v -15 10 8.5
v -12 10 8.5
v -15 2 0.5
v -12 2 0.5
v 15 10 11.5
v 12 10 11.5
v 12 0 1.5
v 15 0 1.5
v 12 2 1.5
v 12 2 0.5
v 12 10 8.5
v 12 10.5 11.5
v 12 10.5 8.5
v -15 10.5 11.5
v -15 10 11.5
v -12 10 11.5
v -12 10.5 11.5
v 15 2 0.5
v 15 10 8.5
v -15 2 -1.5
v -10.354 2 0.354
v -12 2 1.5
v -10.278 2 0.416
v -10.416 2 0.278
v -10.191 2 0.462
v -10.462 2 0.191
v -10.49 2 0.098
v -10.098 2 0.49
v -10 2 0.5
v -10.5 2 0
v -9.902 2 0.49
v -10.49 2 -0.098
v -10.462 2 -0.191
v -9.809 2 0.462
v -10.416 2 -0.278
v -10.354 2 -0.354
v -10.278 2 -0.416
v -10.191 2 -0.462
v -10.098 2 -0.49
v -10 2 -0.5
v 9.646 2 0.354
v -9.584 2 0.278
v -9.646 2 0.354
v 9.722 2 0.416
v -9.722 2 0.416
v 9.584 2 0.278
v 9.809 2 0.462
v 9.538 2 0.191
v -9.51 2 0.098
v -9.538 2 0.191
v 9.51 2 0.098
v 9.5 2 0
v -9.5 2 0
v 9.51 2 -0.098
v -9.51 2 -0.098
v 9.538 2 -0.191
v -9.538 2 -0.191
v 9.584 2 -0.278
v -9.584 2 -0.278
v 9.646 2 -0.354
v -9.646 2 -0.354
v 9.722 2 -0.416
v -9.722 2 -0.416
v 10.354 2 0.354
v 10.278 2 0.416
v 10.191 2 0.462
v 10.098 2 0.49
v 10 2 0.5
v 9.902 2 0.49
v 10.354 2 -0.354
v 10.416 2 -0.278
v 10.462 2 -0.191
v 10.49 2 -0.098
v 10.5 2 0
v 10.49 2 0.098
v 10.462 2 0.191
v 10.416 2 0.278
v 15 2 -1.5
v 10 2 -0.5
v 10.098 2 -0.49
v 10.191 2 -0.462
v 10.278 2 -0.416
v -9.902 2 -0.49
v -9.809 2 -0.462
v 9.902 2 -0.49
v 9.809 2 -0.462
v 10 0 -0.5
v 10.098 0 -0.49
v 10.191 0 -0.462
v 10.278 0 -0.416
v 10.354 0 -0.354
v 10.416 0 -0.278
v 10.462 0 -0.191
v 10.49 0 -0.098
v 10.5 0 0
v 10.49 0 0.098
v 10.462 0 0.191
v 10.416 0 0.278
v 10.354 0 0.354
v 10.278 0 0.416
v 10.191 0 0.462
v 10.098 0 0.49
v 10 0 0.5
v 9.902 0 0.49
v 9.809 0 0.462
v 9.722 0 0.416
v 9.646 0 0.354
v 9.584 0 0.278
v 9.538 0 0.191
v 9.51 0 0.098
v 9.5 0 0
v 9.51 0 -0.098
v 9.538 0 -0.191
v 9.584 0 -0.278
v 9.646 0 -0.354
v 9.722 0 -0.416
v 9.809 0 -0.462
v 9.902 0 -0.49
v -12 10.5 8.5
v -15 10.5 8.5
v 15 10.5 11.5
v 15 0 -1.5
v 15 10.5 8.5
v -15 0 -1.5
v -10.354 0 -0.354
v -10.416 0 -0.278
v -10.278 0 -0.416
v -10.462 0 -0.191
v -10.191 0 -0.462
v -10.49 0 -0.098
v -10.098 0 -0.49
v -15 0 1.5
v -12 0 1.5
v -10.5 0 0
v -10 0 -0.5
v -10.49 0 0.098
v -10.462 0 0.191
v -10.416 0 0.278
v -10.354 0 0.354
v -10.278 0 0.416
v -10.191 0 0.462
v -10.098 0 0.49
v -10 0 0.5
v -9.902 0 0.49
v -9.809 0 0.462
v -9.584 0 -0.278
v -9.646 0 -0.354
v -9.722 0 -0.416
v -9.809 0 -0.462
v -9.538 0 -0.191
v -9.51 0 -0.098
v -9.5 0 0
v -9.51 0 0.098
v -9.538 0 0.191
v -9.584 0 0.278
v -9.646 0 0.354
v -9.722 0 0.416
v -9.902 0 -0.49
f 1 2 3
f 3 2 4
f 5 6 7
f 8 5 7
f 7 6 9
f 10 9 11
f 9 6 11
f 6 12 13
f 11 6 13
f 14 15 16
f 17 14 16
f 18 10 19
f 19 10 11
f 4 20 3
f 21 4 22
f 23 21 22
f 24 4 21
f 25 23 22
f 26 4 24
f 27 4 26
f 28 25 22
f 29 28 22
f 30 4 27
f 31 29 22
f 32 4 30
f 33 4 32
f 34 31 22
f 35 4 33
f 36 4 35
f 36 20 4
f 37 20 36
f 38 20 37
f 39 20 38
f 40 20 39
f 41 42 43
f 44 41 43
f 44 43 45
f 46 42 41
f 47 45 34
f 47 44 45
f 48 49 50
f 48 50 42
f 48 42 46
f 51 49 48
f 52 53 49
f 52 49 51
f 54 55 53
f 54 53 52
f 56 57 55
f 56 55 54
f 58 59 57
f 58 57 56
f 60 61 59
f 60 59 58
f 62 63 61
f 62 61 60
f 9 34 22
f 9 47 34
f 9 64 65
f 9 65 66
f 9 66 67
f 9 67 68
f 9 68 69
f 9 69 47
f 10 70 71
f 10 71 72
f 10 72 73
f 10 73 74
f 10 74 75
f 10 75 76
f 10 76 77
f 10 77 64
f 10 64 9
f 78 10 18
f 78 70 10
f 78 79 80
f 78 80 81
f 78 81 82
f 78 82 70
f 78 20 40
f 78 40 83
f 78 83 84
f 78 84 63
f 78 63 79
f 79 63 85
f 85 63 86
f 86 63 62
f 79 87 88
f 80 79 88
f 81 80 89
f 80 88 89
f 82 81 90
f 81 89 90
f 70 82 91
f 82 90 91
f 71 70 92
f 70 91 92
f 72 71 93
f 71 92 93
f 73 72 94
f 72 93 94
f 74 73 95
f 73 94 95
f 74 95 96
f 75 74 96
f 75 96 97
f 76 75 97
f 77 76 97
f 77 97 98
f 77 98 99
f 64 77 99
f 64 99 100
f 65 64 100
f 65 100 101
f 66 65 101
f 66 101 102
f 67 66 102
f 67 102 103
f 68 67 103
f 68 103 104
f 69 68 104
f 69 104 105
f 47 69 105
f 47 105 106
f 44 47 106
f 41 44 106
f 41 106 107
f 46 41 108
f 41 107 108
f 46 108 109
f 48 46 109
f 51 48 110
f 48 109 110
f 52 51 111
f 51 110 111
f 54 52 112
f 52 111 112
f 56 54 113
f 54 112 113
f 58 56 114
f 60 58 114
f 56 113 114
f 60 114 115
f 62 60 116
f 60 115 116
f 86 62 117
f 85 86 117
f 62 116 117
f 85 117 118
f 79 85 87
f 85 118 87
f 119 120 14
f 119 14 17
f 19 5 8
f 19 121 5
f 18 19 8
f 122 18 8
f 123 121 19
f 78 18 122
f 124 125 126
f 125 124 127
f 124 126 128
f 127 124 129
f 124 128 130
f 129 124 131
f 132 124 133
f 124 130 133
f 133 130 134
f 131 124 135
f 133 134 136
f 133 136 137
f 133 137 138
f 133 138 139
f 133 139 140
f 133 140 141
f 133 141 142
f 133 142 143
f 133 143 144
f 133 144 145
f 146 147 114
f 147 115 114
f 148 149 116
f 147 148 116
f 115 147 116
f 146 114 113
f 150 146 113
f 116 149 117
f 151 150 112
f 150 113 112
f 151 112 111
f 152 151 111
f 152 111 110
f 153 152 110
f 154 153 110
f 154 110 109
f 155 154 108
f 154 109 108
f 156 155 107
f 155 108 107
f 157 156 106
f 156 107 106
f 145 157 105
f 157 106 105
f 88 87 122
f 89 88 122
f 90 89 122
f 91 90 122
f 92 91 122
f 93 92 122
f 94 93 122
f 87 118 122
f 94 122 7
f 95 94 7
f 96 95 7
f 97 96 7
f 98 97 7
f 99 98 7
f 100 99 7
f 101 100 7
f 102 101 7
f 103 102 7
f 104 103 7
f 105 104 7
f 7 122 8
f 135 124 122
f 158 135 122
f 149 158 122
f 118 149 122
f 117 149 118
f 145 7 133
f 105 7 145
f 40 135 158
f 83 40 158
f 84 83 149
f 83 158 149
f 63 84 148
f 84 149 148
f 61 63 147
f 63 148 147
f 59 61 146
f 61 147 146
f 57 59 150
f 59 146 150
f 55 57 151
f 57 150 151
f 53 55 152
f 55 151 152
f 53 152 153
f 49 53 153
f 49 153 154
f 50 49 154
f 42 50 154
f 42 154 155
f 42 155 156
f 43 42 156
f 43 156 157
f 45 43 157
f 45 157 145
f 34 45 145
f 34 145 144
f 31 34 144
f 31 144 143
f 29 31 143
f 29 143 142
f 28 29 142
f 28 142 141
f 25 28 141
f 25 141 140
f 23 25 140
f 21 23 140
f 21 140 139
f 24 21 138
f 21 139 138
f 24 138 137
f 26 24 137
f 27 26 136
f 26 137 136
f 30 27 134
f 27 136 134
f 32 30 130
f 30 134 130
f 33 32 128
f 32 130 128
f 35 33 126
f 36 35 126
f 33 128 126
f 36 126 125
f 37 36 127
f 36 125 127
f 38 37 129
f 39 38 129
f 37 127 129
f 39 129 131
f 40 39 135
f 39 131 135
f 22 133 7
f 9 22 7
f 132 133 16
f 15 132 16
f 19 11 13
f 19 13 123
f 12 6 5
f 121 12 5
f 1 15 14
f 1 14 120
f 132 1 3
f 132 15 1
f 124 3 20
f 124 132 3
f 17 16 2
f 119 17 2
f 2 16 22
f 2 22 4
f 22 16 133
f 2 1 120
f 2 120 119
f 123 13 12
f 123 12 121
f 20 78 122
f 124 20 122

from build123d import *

# Parameters (mm, degrees)
SKETCH1_W           = 24
SKETCH1_H           = 3
BOSS_EXTRUDE1_DEPTH = 2
BOSS_EXTRUDE2_DEPTH = 3
BOSS_EXTRUDE3_DEPTH = 3
CUT_EXTRUDE1_REACH  = 23.383
SKETCH6_R           = 0.5
SKETCH9_W           = 3
SKETCH9_H           = 3
BOSS_EXTRUDE4_DEPTH = 0.5


with BuildPart() as part:
    # Sketch1 → Boss-Extrude1 (new body)
    with BuildSketch(Plane(origin=(0, 0, 0), x_dir=(1, 0, 0), z_dir=(0, 1, 0))):
        Rectangle(SKETCH1_W, SKETCH1_H)
    extrude(amount=BOSS_EXTRUDE1_DEPTH)

    # Sketch4 → Boss-Extrude2 (add)
    with BuildSketch(Plane(origin=(12, 0, 0), x_dir=(0, 0, -1), z_dir=(1, 0, 0))):
        Polygon((-11.5, 10), (-1.5, 0), (1.5, 0), (1.5, 2), (-0.5, 2), (-8.5, 10), align=None)
    extrude(amount=BOSS_EXTRUDE2_DEPTH)

    # Sketch5 → Boss-Extrude3 (add)
    with BuildSketch(Plane.ZY.offset(12)):
        Polygon((1.5, 0), (11.5, 10), (8.5, 10), (0.5, 2), (-1.5, 2), (-1.5, 0), align=None)
    extrude(amount=BOSS_EXTRUDE3_DEPTH)

    # Sketch6 → Cut-Extrude1 (cut, up to next)
    with BuildSketch(Plane.XZ, mode=Mode.PRIVATE) as cut_extrude1_sk1:
        with Locations(Location((-10, 0, 0), (0, 0, 270))):
            Circle(SKETCH6_R)
    cut_extrude1_tool1 = extrude(cut_extrude1_sk1.sketch, amount=-CUT_EXTRUDE1_REACH, mode=Mode.PRIVATE) & part.part
    # Sketch6 → Cut-Extrude1 (cut, up to next)
    with BuildSketch(Plane.XZ, mode=Mode.PRIVATE) as cut_extrude1_sk2:
        with Locations(Location((10, 0, 0), (0, 0, 270))):
            Circle(SKETCH6_R)
    cut_extrude1_tool2 = extrude(cut_extrude1_sk2.sketch, amount=-CUT_EXTRUDE1_REACH, mode=Mode.PRIVATE) & part.part
    add(cut_extrude1_tool1.solids().sort_by_distance((-10, 0, 0))[0], mode=Mode.SUBTRACT)
    add(cut_extrude1_tool2.solids().sort_by_distance((10, 0, 0))[0], mode=Mode.SUBTRACT)

    # Sketch9 → Boss-Extrude4 (add)
    with BuildSketch(Plane(origin=(0, 10, 0), x_dir=(1, 0, 0), z_dir=(0, 1, 0))):
        with Locations((-13.5, -10)):
            Rectangle(SKETCH9_W, SKETCH9_H)
        with Locations((13.5, -10)):
            Rectangle(SKETCH9_W, SKETCH9_H)
    extrude(amount=BOSS_EXTRUDE4_DEPTH)


solid = part.part
